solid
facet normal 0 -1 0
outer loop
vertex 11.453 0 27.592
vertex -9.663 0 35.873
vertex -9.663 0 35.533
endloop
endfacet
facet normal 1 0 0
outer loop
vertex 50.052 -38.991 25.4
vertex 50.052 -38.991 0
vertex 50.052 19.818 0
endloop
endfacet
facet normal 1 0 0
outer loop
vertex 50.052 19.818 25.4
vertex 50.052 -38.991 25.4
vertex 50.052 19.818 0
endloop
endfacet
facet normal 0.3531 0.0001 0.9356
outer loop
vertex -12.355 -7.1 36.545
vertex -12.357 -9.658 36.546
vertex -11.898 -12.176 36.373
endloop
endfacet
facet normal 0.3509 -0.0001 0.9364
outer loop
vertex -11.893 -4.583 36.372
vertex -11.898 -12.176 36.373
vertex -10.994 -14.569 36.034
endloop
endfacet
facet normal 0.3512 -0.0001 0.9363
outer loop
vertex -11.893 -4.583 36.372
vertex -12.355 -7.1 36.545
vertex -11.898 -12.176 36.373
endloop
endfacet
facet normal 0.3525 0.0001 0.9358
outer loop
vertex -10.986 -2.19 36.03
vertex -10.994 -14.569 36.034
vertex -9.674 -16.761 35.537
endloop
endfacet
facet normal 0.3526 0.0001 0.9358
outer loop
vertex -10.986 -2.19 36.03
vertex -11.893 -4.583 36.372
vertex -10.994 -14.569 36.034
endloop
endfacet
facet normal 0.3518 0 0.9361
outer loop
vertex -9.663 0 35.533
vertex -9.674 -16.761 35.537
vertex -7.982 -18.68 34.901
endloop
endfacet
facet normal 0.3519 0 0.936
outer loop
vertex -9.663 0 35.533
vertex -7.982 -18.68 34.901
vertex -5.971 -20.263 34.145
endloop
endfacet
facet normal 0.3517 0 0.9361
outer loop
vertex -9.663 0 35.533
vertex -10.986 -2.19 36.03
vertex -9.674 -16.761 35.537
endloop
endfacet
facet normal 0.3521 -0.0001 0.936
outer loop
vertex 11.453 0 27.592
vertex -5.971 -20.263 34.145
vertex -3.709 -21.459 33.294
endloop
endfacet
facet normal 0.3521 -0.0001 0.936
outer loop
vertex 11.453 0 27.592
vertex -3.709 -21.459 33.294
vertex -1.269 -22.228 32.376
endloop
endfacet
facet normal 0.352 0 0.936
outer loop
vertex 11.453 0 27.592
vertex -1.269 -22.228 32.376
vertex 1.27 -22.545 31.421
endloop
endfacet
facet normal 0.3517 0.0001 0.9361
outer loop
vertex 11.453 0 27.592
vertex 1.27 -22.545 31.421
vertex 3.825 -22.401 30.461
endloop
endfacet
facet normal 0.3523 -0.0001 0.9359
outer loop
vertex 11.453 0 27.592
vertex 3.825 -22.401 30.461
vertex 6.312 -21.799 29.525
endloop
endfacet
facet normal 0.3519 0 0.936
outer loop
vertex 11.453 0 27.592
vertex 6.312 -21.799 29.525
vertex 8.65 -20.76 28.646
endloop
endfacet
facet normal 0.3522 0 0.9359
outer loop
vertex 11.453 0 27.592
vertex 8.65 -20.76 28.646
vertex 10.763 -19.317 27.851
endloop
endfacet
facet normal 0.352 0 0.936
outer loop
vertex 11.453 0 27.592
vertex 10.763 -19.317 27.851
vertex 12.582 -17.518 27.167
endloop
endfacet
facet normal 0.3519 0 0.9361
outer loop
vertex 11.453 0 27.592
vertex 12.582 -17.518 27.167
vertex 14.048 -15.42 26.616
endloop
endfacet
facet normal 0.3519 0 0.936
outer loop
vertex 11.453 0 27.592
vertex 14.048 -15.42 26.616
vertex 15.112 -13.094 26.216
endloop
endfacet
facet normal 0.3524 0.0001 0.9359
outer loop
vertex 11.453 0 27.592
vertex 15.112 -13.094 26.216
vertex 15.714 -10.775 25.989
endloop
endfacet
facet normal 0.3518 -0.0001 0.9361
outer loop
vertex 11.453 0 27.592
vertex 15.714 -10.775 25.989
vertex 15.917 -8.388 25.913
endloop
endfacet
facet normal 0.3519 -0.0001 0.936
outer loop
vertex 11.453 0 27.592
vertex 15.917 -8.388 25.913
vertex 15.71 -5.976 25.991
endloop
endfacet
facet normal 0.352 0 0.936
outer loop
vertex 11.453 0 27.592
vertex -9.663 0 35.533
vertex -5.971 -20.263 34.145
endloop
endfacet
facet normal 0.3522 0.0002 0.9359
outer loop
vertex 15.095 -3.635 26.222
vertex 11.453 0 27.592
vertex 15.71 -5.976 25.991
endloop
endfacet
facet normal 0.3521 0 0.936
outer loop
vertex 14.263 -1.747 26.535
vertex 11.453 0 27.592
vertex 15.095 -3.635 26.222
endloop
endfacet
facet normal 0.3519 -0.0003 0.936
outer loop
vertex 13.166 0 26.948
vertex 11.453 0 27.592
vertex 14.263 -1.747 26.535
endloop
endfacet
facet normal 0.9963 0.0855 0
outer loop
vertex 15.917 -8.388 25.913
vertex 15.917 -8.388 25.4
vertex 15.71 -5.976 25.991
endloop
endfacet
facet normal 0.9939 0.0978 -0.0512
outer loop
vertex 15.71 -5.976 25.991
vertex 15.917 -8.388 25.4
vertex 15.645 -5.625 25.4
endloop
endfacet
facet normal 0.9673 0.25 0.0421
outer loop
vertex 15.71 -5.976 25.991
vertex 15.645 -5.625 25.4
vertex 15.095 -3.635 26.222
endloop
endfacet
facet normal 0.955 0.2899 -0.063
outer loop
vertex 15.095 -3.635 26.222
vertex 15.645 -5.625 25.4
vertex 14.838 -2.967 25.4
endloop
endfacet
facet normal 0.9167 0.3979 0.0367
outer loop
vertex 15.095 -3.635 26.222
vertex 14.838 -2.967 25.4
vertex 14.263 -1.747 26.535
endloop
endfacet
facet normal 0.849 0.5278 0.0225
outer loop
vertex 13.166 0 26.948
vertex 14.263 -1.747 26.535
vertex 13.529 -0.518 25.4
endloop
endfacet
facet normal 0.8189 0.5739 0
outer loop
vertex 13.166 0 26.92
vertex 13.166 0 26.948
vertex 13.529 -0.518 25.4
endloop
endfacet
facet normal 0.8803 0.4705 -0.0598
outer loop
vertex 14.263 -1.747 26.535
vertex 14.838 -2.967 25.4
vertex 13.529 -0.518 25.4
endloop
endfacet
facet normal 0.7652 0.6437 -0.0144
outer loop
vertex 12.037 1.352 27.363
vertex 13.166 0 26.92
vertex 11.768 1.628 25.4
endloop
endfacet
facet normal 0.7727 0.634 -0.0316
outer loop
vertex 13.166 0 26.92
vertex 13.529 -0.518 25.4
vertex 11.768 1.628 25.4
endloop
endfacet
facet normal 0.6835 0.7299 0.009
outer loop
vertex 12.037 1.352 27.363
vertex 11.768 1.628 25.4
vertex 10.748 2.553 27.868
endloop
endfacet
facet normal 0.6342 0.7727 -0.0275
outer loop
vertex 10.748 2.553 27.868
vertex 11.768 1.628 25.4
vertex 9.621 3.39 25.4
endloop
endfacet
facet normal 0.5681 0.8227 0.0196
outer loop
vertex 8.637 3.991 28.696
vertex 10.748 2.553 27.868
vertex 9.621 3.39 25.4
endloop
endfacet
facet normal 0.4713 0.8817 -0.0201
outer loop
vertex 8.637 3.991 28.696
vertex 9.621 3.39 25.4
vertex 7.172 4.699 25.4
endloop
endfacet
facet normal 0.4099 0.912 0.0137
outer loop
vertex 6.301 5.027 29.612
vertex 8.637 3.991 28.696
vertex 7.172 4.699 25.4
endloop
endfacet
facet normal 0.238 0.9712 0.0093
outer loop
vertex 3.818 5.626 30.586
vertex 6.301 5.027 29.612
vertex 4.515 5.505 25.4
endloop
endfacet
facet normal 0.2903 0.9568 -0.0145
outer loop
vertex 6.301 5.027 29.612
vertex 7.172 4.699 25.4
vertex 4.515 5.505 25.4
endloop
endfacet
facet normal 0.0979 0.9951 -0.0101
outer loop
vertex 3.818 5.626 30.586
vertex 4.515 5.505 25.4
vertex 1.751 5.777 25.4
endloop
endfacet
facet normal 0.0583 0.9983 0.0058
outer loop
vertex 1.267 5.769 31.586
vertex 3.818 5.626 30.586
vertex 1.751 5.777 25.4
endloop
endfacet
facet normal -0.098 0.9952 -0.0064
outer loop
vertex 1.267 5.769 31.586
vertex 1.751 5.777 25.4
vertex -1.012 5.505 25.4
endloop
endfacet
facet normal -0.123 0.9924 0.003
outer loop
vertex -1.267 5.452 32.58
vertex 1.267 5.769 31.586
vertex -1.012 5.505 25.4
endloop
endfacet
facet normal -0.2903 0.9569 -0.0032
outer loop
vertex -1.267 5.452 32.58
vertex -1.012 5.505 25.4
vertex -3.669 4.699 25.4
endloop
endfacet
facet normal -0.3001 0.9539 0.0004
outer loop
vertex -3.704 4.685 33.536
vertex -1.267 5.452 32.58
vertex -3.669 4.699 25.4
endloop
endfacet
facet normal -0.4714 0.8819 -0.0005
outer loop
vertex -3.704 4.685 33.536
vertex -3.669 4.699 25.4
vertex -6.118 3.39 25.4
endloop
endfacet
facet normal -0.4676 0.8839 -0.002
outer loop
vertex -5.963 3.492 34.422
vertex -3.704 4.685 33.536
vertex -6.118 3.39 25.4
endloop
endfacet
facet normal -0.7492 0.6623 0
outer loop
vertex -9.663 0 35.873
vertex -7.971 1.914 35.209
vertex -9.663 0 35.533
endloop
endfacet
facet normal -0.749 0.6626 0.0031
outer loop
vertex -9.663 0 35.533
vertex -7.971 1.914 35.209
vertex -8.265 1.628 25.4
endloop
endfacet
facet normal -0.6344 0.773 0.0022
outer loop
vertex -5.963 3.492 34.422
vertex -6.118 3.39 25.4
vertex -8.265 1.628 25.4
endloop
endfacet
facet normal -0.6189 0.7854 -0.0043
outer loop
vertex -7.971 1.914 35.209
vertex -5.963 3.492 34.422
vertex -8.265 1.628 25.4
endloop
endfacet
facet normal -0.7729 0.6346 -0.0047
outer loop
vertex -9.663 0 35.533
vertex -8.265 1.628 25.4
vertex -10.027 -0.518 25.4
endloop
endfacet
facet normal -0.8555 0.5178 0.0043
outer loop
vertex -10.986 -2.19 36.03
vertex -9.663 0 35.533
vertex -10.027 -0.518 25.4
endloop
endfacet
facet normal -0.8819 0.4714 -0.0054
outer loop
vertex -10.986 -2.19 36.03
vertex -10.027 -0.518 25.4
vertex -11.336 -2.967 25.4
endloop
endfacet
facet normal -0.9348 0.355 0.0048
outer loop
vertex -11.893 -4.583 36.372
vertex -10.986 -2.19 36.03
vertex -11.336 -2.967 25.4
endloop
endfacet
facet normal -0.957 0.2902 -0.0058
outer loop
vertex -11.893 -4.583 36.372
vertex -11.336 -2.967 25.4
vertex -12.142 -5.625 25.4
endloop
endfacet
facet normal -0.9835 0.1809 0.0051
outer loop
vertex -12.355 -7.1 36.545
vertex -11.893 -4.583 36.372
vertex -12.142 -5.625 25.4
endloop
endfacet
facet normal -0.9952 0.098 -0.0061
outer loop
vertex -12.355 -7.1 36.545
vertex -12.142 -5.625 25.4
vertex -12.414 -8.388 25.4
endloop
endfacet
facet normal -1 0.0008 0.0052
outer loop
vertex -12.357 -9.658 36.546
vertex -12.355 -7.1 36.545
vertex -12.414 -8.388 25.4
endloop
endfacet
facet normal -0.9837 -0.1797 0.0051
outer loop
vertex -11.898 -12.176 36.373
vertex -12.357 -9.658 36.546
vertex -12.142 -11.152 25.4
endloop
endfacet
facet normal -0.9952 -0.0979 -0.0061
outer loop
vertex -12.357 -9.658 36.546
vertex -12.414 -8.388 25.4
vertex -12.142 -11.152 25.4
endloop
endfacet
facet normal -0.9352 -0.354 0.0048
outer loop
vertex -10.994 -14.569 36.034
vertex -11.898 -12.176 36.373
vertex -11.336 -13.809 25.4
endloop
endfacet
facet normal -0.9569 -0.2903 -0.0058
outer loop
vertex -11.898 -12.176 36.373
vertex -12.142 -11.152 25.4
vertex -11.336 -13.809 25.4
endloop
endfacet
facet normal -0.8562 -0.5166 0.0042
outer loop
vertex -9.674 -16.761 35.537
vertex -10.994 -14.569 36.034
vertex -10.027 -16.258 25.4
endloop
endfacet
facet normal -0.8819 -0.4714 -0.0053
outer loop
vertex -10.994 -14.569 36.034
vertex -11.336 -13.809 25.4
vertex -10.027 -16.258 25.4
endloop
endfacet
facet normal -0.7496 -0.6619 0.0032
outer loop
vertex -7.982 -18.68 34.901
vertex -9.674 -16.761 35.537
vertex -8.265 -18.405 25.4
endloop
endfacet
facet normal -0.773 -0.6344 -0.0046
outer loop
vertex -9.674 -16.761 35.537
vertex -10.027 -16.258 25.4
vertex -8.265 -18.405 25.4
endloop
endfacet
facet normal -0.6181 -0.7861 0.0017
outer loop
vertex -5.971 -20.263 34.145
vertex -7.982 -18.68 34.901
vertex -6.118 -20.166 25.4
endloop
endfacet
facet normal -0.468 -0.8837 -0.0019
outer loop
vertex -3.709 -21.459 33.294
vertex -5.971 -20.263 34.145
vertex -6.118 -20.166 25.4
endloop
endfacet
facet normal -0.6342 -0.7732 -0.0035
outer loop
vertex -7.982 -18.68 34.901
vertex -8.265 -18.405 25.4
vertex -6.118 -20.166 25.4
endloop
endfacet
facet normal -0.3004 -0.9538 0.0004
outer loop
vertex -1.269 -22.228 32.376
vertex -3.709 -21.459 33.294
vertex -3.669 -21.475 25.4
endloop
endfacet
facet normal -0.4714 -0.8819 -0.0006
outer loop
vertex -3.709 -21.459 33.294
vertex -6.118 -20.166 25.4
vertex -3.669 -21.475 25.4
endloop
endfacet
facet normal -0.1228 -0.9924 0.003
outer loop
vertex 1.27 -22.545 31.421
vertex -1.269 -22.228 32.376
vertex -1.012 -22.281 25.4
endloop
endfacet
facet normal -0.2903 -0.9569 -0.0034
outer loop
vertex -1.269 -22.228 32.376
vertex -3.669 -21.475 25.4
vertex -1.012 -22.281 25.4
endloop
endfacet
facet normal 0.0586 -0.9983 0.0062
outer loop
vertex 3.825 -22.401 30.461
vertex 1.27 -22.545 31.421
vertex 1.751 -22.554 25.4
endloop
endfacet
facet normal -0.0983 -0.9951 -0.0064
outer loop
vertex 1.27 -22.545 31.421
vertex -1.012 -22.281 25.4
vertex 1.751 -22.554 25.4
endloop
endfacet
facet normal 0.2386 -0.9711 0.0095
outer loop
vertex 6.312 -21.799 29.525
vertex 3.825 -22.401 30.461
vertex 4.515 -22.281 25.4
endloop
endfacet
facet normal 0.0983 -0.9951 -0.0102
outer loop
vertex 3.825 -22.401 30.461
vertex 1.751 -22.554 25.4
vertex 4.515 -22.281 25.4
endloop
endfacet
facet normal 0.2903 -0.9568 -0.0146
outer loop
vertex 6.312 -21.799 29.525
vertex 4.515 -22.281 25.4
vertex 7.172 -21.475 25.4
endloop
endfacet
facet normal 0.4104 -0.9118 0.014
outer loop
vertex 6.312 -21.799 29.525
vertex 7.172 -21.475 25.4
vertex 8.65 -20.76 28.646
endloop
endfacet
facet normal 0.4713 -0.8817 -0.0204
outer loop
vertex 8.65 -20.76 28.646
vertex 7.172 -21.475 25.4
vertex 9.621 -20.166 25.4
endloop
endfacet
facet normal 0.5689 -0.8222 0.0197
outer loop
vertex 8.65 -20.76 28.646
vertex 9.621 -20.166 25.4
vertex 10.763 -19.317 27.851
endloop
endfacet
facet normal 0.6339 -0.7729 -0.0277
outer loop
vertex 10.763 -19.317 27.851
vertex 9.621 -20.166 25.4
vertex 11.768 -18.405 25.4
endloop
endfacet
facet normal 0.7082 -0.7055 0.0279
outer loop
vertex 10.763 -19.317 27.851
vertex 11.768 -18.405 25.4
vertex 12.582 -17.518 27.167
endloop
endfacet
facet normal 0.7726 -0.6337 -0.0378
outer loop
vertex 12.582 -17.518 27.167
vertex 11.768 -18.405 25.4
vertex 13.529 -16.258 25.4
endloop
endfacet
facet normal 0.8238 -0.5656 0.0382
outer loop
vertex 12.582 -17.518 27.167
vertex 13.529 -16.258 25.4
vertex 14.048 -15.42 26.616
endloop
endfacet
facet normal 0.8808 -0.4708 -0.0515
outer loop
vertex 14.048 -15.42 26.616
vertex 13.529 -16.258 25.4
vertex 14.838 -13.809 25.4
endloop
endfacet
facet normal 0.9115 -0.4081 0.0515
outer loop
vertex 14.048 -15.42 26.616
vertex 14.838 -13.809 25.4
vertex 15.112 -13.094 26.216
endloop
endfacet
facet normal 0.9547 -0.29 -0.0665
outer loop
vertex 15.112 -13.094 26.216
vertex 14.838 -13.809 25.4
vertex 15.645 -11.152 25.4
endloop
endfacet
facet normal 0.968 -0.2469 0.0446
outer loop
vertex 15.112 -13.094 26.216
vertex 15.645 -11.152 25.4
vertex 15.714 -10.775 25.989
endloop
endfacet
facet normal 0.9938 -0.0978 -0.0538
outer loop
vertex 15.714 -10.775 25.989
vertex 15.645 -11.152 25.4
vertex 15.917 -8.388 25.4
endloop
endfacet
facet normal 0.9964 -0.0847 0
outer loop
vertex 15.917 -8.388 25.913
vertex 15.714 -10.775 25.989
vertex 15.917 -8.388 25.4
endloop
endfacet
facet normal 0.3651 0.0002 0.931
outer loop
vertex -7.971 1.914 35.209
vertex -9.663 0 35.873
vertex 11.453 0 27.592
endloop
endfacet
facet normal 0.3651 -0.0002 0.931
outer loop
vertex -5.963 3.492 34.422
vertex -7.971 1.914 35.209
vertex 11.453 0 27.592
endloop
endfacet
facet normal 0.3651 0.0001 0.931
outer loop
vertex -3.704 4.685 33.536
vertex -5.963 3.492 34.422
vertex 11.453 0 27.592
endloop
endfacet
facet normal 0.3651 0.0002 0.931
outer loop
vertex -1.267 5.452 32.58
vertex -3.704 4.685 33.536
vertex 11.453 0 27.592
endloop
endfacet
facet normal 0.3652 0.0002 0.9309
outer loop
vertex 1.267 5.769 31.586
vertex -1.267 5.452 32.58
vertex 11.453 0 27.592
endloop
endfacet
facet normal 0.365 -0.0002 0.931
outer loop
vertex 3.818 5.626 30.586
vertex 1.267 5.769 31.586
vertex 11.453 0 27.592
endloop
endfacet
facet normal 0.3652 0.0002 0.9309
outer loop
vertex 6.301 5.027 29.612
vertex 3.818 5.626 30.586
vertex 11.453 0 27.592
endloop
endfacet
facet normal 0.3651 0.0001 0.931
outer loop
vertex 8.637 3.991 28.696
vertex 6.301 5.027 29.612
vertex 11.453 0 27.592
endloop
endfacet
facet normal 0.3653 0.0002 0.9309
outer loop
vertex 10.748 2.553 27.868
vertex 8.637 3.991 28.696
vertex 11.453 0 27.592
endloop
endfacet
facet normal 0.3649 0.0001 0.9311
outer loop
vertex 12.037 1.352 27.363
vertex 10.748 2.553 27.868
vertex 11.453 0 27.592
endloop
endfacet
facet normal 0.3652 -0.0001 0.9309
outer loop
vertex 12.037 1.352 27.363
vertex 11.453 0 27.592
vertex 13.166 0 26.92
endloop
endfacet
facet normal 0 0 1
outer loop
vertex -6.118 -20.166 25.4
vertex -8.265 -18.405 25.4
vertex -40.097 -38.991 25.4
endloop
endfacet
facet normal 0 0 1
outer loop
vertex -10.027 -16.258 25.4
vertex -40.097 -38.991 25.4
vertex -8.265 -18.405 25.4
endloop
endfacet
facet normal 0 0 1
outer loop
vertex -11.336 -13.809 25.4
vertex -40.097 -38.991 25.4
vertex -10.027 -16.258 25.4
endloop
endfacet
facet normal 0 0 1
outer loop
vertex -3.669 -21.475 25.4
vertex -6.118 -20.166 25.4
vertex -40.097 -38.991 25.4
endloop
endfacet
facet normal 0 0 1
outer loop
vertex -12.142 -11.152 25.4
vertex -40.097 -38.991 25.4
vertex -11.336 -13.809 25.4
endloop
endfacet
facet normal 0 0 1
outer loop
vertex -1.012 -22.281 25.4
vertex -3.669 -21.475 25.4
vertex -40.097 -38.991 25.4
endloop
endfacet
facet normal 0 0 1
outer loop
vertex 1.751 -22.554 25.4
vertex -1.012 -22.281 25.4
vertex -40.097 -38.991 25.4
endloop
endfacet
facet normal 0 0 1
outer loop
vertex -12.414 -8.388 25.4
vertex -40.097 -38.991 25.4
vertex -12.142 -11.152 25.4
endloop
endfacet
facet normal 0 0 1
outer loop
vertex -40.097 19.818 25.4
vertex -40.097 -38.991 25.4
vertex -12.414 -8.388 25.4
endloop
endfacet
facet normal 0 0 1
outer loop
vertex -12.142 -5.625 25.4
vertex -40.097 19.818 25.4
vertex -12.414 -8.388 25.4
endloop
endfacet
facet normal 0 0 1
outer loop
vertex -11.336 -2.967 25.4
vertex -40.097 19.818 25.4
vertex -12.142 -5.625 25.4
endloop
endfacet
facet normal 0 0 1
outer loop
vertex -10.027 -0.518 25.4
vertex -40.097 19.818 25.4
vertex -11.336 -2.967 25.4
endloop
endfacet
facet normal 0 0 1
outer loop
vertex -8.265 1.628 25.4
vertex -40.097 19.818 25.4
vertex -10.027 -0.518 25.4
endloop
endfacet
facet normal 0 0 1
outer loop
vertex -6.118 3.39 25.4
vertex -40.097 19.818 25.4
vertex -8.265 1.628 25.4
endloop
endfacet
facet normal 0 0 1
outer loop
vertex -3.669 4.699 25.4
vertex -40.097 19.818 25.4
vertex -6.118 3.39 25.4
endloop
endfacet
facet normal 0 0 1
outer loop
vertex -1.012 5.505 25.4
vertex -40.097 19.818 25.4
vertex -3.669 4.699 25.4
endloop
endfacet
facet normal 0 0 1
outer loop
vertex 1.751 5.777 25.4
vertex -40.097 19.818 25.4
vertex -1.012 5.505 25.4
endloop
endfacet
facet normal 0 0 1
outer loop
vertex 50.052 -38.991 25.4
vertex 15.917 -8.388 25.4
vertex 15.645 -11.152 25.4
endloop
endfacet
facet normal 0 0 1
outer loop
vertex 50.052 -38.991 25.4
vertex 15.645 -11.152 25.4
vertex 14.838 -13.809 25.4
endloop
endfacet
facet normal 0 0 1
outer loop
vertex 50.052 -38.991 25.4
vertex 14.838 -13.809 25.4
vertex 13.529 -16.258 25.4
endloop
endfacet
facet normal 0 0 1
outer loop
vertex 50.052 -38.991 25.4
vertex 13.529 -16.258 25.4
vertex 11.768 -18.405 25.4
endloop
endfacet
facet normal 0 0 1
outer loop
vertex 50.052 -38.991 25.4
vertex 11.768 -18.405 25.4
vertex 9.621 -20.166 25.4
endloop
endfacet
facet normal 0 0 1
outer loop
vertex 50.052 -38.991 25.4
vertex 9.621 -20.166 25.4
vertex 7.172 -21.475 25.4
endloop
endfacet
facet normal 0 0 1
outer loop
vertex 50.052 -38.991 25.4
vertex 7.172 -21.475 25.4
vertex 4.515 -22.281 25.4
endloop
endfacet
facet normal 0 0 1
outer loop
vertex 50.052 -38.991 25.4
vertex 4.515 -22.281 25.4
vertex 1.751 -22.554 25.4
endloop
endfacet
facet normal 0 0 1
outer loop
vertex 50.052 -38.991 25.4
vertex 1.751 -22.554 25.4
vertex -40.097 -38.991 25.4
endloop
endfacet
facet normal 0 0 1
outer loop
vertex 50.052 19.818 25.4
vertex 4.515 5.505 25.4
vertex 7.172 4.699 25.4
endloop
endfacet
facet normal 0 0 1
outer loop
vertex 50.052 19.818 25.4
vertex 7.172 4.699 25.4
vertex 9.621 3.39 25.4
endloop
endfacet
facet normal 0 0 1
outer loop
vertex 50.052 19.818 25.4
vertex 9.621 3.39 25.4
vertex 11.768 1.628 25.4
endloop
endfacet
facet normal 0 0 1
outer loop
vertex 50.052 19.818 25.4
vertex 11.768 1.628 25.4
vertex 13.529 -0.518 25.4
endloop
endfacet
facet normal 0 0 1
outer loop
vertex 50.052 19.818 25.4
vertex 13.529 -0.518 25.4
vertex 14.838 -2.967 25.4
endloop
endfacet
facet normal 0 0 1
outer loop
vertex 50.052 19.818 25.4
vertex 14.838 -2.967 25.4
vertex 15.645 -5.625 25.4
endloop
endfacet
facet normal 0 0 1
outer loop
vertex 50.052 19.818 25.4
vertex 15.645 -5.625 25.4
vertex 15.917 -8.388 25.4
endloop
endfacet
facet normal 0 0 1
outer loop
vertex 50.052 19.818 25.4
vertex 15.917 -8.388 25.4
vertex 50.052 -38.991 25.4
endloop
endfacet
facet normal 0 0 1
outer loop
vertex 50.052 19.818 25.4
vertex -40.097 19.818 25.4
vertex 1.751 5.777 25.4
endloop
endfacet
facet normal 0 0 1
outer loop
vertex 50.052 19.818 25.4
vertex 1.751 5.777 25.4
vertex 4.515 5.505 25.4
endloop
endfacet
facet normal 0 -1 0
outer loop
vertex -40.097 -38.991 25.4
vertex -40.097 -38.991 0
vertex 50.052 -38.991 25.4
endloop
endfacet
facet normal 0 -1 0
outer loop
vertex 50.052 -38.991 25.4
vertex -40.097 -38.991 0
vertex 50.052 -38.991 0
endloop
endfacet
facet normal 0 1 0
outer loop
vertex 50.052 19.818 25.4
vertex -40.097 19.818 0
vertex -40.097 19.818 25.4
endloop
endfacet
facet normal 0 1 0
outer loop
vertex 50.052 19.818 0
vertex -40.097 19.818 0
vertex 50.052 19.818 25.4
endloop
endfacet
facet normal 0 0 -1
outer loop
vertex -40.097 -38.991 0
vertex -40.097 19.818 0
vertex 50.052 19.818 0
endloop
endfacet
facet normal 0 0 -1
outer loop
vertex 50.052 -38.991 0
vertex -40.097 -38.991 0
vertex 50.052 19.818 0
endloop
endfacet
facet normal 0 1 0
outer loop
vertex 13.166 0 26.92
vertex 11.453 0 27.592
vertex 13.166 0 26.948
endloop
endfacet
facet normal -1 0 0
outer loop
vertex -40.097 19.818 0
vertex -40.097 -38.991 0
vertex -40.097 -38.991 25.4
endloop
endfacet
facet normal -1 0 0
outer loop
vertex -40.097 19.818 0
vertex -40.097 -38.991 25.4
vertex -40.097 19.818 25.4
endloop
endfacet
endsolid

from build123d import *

# Parameters (mm, degrees)
F0_W     = 90.149514
F0_H     = 58.809195
F1_DEPTH = 25.4
F2_R     = 14.165363
F3_DEPTH = 38.1
F5_DEPTH = 261.366
F7_DEPTH = 25.4


with BuildPart() as f1:
    # F0 (on Top) → F1 (new body)
    with BuildSketch(Plane.XY):
        with Locations((4.97758, -9.586451)):
            Rectangle(F0_W, F0_H)
    extrude(amount=F1_DEPTH)

    # F2 (on Top) → F3 (join)
    with BuildSketch(Plane.XY):
        with Locations((1.751372, -8.388145)):
            Circle(F2_R)
    extrude(amount=F3_DEPTH)

    # F4 (on Front) → F5 (cut)
    with BuildSketch(Plane.XZ):
        Polygon((15.946694, 45.627825), (-27.192339, 42.125084), (15.946694, 25.901856), align=None)
    extrude(amount=F5_DEPTH, mode=Mode.SUBTRACT)

    # F6 (on Front) → F7 (cut)
    with BuildSketch(Plane.XZ):
        Polygon((-12.628307, 43.968629), (-12.443951, 36.963146), (15.76234, 25.901856), (15.76234, 43.968629), align=None)
    extrude(amount=-F7_DEPTH, mode=Mode.SUBTRACT)


solid = f1.part
